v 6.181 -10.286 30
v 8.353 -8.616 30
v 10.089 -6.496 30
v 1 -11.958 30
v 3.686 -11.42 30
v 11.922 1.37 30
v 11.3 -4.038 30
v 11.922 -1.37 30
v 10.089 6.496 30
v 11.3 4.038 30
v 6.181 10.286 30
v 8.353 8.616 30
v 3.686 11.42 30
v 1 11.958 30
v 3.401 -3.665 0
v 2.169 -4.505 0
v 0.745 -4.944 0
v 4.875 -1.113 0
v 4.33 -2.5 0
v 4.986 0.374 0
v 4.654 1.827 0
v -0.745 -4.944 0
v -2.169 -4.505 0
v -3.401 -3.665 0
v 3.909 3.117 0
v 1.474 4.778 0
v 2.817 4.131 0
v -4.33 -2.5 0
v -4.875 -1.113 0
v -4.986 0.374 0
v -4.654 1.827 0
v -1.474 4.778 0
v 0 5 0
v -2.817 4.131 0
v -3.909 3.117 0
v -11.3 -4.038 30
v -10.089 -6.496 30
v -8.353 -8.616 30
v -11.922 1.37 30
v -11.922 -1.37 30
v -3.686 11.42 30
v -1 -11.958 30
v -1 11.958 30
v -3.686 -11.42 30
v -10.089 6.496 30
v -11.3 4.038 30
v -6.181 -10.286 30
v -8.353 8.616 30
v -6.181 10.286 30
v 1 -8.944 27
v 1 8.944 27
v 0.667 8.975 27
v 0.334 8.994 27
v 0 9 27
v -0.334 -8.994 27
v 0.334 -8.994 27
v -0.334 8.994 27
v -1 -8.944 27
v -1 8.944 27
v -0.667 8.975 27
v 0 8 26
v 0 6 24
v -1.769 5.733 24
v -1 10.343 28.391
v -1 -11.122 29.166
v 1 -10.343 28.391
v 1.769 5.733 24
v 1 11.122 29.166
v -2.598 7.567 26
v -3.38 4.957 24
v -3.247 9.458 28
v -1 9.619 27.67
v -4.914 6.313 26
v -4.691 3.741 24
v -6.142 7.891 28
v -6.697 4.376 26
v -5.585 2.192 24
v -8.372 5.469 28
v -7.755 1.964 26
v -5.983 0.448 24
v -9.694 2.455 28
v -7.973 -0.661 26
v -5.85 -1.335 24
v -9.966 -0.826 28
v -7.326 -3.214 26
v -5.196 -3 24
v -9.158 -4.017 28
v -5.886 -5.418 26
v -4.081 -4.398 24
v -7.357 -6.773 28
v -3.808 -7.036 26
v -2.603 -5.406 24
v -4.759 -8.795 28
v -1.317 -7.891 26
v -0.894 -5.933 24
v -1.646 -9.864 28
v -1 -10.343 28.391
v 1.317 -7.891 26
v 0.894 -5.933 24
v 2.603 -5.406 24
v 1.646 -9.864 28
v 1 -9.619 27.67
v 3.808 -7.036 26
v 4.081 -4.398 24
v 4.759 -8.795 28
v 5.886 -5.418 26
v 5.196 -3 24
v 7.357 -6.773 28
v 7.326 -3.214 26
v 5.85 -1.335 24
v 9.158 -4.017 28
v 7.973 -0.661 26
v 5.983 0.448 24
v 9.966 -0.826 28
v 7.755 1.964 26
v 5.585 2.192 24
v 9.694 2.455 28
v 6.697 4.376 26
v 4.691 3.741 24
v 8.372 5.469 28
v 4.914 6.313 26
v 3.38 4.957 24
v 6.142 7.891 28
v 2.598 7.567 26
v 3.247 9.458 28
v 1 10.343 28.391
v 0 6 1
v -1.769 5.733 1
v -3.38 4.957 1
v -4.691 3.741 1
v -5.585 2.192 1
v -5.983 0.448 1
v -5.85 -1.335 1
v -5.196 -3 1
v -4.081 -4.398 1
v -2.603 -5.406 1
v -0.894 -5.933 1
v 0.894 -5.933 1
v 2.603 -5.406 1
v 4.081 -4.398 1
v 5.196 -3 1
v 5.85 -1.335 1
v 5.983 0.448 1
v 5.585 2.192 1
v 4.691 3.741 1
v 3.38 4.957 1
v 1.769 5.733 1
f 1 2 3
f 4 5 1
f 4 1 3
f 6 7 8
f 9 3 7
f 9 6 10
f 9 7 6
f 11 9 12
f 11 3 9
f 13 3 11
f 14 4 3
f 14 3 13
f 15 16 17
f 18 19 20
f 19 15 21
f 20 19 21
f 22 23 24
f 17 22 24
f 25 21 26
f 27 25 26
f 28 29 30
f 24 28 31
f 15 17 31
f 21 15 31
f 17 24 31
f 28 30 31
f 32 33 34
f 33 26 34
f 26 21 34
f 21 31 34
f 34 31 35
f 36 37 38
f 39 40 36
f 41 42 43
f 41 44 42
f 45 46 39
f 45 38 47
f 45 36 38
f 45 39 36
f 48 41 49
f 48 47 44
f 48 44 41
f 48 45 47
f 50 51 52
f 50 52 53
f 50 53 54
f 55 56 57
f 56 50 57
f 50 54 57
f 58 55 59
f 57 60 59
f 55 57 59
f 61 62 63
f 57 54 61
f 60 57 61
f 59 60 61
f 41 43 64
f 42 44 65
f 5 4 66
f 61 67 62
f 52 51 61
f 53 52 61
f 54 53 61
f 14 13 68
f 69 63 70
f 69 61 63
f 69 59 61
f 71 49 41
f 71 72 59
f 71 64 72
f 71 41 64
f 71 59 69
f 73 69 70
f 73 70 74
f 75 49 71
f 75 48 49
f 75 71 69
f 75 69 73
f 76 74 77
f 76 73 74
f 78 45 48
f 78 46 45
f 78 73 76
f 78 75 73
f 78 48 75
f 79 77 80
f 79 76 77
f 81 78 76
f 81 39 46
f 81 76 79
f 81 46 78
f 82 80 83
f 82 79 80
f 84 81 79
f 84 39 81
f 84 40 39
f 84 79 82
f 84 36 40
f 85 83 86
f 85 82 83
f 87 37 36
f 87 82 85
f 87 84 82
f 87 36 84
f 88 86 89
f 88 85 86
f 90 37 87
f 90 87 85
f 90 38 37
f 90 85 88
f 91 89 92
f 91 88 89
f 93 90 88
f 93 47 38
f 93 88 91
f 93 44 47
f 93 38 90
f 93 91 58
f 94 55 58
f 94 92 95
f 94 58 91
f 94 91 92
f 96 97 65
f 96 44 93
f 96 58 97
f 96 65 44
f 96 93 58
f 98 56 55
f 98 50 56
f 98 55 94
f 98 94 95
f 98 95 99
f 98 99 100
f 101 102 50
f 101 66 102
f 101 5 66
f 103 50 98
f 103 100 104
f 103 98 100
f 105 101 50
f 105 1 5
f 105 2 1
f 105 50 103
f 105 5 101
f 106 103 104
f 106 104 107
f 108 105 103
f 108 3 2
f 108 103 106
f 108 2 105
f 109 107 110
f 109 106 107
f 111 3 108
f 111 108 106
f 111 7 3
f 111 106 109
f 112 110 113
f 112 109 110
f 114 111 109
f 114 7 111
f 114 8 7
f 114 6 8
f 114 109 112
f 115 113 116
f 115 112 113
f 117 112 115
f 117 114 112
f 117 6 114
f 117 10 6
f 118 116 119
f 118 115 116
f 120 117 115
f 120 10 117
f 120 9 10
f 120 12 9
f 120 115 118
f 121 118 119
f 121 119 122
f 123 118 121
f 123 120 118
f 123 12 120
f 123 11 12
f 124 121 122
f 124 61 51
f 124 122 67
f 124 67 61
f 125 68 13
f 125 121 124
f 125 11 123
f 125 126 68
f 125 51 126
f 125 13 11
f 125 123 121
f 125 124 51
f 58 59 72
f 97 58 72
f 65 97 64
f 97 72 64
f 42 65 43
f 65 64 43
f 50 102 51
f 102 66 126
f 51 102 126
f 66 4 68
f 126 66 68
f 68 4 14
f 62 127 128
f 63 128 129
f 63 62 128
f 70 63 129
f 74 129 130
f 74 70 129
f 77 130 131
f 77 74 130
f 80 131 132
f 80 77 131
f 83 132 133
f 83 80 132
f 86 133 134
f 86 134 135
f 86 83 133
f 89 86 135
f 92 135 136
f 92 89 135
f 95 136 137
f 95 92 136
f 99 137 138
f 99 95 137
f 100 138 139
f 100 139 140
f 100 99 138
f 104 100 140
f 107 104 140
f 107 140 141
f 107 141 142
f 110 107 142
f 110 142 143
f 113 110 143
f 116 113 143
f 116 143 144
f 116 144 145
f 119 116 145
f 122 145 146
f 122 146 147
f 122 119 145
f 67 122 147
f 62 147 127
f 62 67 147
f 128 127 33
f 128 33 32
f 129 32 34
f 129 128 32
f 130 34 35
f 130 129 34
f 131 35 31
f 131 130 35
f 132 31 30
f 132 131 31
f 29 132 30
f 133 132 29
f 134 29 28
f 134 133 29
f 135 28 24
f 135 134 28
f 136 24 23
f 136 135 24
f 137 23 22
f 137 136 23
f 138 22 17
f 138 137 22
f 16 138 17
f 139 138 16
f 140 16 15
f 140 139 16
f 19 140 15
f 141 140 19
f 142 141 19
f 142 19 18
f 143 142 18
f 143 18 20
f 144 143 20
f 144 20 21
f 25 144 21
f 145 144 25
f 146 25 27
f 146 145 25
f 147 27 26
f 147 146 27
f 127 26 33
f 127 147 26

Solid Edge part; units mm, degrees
sketch "Sketch1" plane through (0, 0, 0) normal (1, 0, 0) x (0, 1, 0)
  line L0 (0, 0) -> (6, 0)
  line L1 (6, 0) -> (6, 24)
  line L2 (6, 24) -> (12, 30)
  line L3 (12, 30) -> (0, 30)
  line L4 (0, 30) -> (0, 0)
  dimension "D1" = 6
  dimension "D2" = 12
  dimension "D3" = 30
  dimension "D4" = 24
revolve "RevolvedProtrusion1" add sketch "Sketch1" angle 360 about axis through (0, 0, -57) along (0, 0, 1)
sketch "Sketch2" plane through (0, 0, 0) normal (0, -1, 0) x (1, 0, 0)
  line L0 (-1, 32.5562) -> (1, 32.5562)
  line L1 (1, 32.5562) -> (1, 27)
  line L2 (1, 27) -> (-1, 27)
  line L3 (-1, 27) -> (-1, 32.5562)
  dimension "D1" = 2
  dimension "D2" = 3
extrude "Cutout1" cut sketch "Sketch2" along normal mid plane 89.2253
cosmetic_thread "Thread1" size "Tr 12 x 3"
chamfer "Chamfer_3" distance 1 angle 45 1 edges at (-6, 0, 0)
properties part number "6" material "Fe - 410 W"
